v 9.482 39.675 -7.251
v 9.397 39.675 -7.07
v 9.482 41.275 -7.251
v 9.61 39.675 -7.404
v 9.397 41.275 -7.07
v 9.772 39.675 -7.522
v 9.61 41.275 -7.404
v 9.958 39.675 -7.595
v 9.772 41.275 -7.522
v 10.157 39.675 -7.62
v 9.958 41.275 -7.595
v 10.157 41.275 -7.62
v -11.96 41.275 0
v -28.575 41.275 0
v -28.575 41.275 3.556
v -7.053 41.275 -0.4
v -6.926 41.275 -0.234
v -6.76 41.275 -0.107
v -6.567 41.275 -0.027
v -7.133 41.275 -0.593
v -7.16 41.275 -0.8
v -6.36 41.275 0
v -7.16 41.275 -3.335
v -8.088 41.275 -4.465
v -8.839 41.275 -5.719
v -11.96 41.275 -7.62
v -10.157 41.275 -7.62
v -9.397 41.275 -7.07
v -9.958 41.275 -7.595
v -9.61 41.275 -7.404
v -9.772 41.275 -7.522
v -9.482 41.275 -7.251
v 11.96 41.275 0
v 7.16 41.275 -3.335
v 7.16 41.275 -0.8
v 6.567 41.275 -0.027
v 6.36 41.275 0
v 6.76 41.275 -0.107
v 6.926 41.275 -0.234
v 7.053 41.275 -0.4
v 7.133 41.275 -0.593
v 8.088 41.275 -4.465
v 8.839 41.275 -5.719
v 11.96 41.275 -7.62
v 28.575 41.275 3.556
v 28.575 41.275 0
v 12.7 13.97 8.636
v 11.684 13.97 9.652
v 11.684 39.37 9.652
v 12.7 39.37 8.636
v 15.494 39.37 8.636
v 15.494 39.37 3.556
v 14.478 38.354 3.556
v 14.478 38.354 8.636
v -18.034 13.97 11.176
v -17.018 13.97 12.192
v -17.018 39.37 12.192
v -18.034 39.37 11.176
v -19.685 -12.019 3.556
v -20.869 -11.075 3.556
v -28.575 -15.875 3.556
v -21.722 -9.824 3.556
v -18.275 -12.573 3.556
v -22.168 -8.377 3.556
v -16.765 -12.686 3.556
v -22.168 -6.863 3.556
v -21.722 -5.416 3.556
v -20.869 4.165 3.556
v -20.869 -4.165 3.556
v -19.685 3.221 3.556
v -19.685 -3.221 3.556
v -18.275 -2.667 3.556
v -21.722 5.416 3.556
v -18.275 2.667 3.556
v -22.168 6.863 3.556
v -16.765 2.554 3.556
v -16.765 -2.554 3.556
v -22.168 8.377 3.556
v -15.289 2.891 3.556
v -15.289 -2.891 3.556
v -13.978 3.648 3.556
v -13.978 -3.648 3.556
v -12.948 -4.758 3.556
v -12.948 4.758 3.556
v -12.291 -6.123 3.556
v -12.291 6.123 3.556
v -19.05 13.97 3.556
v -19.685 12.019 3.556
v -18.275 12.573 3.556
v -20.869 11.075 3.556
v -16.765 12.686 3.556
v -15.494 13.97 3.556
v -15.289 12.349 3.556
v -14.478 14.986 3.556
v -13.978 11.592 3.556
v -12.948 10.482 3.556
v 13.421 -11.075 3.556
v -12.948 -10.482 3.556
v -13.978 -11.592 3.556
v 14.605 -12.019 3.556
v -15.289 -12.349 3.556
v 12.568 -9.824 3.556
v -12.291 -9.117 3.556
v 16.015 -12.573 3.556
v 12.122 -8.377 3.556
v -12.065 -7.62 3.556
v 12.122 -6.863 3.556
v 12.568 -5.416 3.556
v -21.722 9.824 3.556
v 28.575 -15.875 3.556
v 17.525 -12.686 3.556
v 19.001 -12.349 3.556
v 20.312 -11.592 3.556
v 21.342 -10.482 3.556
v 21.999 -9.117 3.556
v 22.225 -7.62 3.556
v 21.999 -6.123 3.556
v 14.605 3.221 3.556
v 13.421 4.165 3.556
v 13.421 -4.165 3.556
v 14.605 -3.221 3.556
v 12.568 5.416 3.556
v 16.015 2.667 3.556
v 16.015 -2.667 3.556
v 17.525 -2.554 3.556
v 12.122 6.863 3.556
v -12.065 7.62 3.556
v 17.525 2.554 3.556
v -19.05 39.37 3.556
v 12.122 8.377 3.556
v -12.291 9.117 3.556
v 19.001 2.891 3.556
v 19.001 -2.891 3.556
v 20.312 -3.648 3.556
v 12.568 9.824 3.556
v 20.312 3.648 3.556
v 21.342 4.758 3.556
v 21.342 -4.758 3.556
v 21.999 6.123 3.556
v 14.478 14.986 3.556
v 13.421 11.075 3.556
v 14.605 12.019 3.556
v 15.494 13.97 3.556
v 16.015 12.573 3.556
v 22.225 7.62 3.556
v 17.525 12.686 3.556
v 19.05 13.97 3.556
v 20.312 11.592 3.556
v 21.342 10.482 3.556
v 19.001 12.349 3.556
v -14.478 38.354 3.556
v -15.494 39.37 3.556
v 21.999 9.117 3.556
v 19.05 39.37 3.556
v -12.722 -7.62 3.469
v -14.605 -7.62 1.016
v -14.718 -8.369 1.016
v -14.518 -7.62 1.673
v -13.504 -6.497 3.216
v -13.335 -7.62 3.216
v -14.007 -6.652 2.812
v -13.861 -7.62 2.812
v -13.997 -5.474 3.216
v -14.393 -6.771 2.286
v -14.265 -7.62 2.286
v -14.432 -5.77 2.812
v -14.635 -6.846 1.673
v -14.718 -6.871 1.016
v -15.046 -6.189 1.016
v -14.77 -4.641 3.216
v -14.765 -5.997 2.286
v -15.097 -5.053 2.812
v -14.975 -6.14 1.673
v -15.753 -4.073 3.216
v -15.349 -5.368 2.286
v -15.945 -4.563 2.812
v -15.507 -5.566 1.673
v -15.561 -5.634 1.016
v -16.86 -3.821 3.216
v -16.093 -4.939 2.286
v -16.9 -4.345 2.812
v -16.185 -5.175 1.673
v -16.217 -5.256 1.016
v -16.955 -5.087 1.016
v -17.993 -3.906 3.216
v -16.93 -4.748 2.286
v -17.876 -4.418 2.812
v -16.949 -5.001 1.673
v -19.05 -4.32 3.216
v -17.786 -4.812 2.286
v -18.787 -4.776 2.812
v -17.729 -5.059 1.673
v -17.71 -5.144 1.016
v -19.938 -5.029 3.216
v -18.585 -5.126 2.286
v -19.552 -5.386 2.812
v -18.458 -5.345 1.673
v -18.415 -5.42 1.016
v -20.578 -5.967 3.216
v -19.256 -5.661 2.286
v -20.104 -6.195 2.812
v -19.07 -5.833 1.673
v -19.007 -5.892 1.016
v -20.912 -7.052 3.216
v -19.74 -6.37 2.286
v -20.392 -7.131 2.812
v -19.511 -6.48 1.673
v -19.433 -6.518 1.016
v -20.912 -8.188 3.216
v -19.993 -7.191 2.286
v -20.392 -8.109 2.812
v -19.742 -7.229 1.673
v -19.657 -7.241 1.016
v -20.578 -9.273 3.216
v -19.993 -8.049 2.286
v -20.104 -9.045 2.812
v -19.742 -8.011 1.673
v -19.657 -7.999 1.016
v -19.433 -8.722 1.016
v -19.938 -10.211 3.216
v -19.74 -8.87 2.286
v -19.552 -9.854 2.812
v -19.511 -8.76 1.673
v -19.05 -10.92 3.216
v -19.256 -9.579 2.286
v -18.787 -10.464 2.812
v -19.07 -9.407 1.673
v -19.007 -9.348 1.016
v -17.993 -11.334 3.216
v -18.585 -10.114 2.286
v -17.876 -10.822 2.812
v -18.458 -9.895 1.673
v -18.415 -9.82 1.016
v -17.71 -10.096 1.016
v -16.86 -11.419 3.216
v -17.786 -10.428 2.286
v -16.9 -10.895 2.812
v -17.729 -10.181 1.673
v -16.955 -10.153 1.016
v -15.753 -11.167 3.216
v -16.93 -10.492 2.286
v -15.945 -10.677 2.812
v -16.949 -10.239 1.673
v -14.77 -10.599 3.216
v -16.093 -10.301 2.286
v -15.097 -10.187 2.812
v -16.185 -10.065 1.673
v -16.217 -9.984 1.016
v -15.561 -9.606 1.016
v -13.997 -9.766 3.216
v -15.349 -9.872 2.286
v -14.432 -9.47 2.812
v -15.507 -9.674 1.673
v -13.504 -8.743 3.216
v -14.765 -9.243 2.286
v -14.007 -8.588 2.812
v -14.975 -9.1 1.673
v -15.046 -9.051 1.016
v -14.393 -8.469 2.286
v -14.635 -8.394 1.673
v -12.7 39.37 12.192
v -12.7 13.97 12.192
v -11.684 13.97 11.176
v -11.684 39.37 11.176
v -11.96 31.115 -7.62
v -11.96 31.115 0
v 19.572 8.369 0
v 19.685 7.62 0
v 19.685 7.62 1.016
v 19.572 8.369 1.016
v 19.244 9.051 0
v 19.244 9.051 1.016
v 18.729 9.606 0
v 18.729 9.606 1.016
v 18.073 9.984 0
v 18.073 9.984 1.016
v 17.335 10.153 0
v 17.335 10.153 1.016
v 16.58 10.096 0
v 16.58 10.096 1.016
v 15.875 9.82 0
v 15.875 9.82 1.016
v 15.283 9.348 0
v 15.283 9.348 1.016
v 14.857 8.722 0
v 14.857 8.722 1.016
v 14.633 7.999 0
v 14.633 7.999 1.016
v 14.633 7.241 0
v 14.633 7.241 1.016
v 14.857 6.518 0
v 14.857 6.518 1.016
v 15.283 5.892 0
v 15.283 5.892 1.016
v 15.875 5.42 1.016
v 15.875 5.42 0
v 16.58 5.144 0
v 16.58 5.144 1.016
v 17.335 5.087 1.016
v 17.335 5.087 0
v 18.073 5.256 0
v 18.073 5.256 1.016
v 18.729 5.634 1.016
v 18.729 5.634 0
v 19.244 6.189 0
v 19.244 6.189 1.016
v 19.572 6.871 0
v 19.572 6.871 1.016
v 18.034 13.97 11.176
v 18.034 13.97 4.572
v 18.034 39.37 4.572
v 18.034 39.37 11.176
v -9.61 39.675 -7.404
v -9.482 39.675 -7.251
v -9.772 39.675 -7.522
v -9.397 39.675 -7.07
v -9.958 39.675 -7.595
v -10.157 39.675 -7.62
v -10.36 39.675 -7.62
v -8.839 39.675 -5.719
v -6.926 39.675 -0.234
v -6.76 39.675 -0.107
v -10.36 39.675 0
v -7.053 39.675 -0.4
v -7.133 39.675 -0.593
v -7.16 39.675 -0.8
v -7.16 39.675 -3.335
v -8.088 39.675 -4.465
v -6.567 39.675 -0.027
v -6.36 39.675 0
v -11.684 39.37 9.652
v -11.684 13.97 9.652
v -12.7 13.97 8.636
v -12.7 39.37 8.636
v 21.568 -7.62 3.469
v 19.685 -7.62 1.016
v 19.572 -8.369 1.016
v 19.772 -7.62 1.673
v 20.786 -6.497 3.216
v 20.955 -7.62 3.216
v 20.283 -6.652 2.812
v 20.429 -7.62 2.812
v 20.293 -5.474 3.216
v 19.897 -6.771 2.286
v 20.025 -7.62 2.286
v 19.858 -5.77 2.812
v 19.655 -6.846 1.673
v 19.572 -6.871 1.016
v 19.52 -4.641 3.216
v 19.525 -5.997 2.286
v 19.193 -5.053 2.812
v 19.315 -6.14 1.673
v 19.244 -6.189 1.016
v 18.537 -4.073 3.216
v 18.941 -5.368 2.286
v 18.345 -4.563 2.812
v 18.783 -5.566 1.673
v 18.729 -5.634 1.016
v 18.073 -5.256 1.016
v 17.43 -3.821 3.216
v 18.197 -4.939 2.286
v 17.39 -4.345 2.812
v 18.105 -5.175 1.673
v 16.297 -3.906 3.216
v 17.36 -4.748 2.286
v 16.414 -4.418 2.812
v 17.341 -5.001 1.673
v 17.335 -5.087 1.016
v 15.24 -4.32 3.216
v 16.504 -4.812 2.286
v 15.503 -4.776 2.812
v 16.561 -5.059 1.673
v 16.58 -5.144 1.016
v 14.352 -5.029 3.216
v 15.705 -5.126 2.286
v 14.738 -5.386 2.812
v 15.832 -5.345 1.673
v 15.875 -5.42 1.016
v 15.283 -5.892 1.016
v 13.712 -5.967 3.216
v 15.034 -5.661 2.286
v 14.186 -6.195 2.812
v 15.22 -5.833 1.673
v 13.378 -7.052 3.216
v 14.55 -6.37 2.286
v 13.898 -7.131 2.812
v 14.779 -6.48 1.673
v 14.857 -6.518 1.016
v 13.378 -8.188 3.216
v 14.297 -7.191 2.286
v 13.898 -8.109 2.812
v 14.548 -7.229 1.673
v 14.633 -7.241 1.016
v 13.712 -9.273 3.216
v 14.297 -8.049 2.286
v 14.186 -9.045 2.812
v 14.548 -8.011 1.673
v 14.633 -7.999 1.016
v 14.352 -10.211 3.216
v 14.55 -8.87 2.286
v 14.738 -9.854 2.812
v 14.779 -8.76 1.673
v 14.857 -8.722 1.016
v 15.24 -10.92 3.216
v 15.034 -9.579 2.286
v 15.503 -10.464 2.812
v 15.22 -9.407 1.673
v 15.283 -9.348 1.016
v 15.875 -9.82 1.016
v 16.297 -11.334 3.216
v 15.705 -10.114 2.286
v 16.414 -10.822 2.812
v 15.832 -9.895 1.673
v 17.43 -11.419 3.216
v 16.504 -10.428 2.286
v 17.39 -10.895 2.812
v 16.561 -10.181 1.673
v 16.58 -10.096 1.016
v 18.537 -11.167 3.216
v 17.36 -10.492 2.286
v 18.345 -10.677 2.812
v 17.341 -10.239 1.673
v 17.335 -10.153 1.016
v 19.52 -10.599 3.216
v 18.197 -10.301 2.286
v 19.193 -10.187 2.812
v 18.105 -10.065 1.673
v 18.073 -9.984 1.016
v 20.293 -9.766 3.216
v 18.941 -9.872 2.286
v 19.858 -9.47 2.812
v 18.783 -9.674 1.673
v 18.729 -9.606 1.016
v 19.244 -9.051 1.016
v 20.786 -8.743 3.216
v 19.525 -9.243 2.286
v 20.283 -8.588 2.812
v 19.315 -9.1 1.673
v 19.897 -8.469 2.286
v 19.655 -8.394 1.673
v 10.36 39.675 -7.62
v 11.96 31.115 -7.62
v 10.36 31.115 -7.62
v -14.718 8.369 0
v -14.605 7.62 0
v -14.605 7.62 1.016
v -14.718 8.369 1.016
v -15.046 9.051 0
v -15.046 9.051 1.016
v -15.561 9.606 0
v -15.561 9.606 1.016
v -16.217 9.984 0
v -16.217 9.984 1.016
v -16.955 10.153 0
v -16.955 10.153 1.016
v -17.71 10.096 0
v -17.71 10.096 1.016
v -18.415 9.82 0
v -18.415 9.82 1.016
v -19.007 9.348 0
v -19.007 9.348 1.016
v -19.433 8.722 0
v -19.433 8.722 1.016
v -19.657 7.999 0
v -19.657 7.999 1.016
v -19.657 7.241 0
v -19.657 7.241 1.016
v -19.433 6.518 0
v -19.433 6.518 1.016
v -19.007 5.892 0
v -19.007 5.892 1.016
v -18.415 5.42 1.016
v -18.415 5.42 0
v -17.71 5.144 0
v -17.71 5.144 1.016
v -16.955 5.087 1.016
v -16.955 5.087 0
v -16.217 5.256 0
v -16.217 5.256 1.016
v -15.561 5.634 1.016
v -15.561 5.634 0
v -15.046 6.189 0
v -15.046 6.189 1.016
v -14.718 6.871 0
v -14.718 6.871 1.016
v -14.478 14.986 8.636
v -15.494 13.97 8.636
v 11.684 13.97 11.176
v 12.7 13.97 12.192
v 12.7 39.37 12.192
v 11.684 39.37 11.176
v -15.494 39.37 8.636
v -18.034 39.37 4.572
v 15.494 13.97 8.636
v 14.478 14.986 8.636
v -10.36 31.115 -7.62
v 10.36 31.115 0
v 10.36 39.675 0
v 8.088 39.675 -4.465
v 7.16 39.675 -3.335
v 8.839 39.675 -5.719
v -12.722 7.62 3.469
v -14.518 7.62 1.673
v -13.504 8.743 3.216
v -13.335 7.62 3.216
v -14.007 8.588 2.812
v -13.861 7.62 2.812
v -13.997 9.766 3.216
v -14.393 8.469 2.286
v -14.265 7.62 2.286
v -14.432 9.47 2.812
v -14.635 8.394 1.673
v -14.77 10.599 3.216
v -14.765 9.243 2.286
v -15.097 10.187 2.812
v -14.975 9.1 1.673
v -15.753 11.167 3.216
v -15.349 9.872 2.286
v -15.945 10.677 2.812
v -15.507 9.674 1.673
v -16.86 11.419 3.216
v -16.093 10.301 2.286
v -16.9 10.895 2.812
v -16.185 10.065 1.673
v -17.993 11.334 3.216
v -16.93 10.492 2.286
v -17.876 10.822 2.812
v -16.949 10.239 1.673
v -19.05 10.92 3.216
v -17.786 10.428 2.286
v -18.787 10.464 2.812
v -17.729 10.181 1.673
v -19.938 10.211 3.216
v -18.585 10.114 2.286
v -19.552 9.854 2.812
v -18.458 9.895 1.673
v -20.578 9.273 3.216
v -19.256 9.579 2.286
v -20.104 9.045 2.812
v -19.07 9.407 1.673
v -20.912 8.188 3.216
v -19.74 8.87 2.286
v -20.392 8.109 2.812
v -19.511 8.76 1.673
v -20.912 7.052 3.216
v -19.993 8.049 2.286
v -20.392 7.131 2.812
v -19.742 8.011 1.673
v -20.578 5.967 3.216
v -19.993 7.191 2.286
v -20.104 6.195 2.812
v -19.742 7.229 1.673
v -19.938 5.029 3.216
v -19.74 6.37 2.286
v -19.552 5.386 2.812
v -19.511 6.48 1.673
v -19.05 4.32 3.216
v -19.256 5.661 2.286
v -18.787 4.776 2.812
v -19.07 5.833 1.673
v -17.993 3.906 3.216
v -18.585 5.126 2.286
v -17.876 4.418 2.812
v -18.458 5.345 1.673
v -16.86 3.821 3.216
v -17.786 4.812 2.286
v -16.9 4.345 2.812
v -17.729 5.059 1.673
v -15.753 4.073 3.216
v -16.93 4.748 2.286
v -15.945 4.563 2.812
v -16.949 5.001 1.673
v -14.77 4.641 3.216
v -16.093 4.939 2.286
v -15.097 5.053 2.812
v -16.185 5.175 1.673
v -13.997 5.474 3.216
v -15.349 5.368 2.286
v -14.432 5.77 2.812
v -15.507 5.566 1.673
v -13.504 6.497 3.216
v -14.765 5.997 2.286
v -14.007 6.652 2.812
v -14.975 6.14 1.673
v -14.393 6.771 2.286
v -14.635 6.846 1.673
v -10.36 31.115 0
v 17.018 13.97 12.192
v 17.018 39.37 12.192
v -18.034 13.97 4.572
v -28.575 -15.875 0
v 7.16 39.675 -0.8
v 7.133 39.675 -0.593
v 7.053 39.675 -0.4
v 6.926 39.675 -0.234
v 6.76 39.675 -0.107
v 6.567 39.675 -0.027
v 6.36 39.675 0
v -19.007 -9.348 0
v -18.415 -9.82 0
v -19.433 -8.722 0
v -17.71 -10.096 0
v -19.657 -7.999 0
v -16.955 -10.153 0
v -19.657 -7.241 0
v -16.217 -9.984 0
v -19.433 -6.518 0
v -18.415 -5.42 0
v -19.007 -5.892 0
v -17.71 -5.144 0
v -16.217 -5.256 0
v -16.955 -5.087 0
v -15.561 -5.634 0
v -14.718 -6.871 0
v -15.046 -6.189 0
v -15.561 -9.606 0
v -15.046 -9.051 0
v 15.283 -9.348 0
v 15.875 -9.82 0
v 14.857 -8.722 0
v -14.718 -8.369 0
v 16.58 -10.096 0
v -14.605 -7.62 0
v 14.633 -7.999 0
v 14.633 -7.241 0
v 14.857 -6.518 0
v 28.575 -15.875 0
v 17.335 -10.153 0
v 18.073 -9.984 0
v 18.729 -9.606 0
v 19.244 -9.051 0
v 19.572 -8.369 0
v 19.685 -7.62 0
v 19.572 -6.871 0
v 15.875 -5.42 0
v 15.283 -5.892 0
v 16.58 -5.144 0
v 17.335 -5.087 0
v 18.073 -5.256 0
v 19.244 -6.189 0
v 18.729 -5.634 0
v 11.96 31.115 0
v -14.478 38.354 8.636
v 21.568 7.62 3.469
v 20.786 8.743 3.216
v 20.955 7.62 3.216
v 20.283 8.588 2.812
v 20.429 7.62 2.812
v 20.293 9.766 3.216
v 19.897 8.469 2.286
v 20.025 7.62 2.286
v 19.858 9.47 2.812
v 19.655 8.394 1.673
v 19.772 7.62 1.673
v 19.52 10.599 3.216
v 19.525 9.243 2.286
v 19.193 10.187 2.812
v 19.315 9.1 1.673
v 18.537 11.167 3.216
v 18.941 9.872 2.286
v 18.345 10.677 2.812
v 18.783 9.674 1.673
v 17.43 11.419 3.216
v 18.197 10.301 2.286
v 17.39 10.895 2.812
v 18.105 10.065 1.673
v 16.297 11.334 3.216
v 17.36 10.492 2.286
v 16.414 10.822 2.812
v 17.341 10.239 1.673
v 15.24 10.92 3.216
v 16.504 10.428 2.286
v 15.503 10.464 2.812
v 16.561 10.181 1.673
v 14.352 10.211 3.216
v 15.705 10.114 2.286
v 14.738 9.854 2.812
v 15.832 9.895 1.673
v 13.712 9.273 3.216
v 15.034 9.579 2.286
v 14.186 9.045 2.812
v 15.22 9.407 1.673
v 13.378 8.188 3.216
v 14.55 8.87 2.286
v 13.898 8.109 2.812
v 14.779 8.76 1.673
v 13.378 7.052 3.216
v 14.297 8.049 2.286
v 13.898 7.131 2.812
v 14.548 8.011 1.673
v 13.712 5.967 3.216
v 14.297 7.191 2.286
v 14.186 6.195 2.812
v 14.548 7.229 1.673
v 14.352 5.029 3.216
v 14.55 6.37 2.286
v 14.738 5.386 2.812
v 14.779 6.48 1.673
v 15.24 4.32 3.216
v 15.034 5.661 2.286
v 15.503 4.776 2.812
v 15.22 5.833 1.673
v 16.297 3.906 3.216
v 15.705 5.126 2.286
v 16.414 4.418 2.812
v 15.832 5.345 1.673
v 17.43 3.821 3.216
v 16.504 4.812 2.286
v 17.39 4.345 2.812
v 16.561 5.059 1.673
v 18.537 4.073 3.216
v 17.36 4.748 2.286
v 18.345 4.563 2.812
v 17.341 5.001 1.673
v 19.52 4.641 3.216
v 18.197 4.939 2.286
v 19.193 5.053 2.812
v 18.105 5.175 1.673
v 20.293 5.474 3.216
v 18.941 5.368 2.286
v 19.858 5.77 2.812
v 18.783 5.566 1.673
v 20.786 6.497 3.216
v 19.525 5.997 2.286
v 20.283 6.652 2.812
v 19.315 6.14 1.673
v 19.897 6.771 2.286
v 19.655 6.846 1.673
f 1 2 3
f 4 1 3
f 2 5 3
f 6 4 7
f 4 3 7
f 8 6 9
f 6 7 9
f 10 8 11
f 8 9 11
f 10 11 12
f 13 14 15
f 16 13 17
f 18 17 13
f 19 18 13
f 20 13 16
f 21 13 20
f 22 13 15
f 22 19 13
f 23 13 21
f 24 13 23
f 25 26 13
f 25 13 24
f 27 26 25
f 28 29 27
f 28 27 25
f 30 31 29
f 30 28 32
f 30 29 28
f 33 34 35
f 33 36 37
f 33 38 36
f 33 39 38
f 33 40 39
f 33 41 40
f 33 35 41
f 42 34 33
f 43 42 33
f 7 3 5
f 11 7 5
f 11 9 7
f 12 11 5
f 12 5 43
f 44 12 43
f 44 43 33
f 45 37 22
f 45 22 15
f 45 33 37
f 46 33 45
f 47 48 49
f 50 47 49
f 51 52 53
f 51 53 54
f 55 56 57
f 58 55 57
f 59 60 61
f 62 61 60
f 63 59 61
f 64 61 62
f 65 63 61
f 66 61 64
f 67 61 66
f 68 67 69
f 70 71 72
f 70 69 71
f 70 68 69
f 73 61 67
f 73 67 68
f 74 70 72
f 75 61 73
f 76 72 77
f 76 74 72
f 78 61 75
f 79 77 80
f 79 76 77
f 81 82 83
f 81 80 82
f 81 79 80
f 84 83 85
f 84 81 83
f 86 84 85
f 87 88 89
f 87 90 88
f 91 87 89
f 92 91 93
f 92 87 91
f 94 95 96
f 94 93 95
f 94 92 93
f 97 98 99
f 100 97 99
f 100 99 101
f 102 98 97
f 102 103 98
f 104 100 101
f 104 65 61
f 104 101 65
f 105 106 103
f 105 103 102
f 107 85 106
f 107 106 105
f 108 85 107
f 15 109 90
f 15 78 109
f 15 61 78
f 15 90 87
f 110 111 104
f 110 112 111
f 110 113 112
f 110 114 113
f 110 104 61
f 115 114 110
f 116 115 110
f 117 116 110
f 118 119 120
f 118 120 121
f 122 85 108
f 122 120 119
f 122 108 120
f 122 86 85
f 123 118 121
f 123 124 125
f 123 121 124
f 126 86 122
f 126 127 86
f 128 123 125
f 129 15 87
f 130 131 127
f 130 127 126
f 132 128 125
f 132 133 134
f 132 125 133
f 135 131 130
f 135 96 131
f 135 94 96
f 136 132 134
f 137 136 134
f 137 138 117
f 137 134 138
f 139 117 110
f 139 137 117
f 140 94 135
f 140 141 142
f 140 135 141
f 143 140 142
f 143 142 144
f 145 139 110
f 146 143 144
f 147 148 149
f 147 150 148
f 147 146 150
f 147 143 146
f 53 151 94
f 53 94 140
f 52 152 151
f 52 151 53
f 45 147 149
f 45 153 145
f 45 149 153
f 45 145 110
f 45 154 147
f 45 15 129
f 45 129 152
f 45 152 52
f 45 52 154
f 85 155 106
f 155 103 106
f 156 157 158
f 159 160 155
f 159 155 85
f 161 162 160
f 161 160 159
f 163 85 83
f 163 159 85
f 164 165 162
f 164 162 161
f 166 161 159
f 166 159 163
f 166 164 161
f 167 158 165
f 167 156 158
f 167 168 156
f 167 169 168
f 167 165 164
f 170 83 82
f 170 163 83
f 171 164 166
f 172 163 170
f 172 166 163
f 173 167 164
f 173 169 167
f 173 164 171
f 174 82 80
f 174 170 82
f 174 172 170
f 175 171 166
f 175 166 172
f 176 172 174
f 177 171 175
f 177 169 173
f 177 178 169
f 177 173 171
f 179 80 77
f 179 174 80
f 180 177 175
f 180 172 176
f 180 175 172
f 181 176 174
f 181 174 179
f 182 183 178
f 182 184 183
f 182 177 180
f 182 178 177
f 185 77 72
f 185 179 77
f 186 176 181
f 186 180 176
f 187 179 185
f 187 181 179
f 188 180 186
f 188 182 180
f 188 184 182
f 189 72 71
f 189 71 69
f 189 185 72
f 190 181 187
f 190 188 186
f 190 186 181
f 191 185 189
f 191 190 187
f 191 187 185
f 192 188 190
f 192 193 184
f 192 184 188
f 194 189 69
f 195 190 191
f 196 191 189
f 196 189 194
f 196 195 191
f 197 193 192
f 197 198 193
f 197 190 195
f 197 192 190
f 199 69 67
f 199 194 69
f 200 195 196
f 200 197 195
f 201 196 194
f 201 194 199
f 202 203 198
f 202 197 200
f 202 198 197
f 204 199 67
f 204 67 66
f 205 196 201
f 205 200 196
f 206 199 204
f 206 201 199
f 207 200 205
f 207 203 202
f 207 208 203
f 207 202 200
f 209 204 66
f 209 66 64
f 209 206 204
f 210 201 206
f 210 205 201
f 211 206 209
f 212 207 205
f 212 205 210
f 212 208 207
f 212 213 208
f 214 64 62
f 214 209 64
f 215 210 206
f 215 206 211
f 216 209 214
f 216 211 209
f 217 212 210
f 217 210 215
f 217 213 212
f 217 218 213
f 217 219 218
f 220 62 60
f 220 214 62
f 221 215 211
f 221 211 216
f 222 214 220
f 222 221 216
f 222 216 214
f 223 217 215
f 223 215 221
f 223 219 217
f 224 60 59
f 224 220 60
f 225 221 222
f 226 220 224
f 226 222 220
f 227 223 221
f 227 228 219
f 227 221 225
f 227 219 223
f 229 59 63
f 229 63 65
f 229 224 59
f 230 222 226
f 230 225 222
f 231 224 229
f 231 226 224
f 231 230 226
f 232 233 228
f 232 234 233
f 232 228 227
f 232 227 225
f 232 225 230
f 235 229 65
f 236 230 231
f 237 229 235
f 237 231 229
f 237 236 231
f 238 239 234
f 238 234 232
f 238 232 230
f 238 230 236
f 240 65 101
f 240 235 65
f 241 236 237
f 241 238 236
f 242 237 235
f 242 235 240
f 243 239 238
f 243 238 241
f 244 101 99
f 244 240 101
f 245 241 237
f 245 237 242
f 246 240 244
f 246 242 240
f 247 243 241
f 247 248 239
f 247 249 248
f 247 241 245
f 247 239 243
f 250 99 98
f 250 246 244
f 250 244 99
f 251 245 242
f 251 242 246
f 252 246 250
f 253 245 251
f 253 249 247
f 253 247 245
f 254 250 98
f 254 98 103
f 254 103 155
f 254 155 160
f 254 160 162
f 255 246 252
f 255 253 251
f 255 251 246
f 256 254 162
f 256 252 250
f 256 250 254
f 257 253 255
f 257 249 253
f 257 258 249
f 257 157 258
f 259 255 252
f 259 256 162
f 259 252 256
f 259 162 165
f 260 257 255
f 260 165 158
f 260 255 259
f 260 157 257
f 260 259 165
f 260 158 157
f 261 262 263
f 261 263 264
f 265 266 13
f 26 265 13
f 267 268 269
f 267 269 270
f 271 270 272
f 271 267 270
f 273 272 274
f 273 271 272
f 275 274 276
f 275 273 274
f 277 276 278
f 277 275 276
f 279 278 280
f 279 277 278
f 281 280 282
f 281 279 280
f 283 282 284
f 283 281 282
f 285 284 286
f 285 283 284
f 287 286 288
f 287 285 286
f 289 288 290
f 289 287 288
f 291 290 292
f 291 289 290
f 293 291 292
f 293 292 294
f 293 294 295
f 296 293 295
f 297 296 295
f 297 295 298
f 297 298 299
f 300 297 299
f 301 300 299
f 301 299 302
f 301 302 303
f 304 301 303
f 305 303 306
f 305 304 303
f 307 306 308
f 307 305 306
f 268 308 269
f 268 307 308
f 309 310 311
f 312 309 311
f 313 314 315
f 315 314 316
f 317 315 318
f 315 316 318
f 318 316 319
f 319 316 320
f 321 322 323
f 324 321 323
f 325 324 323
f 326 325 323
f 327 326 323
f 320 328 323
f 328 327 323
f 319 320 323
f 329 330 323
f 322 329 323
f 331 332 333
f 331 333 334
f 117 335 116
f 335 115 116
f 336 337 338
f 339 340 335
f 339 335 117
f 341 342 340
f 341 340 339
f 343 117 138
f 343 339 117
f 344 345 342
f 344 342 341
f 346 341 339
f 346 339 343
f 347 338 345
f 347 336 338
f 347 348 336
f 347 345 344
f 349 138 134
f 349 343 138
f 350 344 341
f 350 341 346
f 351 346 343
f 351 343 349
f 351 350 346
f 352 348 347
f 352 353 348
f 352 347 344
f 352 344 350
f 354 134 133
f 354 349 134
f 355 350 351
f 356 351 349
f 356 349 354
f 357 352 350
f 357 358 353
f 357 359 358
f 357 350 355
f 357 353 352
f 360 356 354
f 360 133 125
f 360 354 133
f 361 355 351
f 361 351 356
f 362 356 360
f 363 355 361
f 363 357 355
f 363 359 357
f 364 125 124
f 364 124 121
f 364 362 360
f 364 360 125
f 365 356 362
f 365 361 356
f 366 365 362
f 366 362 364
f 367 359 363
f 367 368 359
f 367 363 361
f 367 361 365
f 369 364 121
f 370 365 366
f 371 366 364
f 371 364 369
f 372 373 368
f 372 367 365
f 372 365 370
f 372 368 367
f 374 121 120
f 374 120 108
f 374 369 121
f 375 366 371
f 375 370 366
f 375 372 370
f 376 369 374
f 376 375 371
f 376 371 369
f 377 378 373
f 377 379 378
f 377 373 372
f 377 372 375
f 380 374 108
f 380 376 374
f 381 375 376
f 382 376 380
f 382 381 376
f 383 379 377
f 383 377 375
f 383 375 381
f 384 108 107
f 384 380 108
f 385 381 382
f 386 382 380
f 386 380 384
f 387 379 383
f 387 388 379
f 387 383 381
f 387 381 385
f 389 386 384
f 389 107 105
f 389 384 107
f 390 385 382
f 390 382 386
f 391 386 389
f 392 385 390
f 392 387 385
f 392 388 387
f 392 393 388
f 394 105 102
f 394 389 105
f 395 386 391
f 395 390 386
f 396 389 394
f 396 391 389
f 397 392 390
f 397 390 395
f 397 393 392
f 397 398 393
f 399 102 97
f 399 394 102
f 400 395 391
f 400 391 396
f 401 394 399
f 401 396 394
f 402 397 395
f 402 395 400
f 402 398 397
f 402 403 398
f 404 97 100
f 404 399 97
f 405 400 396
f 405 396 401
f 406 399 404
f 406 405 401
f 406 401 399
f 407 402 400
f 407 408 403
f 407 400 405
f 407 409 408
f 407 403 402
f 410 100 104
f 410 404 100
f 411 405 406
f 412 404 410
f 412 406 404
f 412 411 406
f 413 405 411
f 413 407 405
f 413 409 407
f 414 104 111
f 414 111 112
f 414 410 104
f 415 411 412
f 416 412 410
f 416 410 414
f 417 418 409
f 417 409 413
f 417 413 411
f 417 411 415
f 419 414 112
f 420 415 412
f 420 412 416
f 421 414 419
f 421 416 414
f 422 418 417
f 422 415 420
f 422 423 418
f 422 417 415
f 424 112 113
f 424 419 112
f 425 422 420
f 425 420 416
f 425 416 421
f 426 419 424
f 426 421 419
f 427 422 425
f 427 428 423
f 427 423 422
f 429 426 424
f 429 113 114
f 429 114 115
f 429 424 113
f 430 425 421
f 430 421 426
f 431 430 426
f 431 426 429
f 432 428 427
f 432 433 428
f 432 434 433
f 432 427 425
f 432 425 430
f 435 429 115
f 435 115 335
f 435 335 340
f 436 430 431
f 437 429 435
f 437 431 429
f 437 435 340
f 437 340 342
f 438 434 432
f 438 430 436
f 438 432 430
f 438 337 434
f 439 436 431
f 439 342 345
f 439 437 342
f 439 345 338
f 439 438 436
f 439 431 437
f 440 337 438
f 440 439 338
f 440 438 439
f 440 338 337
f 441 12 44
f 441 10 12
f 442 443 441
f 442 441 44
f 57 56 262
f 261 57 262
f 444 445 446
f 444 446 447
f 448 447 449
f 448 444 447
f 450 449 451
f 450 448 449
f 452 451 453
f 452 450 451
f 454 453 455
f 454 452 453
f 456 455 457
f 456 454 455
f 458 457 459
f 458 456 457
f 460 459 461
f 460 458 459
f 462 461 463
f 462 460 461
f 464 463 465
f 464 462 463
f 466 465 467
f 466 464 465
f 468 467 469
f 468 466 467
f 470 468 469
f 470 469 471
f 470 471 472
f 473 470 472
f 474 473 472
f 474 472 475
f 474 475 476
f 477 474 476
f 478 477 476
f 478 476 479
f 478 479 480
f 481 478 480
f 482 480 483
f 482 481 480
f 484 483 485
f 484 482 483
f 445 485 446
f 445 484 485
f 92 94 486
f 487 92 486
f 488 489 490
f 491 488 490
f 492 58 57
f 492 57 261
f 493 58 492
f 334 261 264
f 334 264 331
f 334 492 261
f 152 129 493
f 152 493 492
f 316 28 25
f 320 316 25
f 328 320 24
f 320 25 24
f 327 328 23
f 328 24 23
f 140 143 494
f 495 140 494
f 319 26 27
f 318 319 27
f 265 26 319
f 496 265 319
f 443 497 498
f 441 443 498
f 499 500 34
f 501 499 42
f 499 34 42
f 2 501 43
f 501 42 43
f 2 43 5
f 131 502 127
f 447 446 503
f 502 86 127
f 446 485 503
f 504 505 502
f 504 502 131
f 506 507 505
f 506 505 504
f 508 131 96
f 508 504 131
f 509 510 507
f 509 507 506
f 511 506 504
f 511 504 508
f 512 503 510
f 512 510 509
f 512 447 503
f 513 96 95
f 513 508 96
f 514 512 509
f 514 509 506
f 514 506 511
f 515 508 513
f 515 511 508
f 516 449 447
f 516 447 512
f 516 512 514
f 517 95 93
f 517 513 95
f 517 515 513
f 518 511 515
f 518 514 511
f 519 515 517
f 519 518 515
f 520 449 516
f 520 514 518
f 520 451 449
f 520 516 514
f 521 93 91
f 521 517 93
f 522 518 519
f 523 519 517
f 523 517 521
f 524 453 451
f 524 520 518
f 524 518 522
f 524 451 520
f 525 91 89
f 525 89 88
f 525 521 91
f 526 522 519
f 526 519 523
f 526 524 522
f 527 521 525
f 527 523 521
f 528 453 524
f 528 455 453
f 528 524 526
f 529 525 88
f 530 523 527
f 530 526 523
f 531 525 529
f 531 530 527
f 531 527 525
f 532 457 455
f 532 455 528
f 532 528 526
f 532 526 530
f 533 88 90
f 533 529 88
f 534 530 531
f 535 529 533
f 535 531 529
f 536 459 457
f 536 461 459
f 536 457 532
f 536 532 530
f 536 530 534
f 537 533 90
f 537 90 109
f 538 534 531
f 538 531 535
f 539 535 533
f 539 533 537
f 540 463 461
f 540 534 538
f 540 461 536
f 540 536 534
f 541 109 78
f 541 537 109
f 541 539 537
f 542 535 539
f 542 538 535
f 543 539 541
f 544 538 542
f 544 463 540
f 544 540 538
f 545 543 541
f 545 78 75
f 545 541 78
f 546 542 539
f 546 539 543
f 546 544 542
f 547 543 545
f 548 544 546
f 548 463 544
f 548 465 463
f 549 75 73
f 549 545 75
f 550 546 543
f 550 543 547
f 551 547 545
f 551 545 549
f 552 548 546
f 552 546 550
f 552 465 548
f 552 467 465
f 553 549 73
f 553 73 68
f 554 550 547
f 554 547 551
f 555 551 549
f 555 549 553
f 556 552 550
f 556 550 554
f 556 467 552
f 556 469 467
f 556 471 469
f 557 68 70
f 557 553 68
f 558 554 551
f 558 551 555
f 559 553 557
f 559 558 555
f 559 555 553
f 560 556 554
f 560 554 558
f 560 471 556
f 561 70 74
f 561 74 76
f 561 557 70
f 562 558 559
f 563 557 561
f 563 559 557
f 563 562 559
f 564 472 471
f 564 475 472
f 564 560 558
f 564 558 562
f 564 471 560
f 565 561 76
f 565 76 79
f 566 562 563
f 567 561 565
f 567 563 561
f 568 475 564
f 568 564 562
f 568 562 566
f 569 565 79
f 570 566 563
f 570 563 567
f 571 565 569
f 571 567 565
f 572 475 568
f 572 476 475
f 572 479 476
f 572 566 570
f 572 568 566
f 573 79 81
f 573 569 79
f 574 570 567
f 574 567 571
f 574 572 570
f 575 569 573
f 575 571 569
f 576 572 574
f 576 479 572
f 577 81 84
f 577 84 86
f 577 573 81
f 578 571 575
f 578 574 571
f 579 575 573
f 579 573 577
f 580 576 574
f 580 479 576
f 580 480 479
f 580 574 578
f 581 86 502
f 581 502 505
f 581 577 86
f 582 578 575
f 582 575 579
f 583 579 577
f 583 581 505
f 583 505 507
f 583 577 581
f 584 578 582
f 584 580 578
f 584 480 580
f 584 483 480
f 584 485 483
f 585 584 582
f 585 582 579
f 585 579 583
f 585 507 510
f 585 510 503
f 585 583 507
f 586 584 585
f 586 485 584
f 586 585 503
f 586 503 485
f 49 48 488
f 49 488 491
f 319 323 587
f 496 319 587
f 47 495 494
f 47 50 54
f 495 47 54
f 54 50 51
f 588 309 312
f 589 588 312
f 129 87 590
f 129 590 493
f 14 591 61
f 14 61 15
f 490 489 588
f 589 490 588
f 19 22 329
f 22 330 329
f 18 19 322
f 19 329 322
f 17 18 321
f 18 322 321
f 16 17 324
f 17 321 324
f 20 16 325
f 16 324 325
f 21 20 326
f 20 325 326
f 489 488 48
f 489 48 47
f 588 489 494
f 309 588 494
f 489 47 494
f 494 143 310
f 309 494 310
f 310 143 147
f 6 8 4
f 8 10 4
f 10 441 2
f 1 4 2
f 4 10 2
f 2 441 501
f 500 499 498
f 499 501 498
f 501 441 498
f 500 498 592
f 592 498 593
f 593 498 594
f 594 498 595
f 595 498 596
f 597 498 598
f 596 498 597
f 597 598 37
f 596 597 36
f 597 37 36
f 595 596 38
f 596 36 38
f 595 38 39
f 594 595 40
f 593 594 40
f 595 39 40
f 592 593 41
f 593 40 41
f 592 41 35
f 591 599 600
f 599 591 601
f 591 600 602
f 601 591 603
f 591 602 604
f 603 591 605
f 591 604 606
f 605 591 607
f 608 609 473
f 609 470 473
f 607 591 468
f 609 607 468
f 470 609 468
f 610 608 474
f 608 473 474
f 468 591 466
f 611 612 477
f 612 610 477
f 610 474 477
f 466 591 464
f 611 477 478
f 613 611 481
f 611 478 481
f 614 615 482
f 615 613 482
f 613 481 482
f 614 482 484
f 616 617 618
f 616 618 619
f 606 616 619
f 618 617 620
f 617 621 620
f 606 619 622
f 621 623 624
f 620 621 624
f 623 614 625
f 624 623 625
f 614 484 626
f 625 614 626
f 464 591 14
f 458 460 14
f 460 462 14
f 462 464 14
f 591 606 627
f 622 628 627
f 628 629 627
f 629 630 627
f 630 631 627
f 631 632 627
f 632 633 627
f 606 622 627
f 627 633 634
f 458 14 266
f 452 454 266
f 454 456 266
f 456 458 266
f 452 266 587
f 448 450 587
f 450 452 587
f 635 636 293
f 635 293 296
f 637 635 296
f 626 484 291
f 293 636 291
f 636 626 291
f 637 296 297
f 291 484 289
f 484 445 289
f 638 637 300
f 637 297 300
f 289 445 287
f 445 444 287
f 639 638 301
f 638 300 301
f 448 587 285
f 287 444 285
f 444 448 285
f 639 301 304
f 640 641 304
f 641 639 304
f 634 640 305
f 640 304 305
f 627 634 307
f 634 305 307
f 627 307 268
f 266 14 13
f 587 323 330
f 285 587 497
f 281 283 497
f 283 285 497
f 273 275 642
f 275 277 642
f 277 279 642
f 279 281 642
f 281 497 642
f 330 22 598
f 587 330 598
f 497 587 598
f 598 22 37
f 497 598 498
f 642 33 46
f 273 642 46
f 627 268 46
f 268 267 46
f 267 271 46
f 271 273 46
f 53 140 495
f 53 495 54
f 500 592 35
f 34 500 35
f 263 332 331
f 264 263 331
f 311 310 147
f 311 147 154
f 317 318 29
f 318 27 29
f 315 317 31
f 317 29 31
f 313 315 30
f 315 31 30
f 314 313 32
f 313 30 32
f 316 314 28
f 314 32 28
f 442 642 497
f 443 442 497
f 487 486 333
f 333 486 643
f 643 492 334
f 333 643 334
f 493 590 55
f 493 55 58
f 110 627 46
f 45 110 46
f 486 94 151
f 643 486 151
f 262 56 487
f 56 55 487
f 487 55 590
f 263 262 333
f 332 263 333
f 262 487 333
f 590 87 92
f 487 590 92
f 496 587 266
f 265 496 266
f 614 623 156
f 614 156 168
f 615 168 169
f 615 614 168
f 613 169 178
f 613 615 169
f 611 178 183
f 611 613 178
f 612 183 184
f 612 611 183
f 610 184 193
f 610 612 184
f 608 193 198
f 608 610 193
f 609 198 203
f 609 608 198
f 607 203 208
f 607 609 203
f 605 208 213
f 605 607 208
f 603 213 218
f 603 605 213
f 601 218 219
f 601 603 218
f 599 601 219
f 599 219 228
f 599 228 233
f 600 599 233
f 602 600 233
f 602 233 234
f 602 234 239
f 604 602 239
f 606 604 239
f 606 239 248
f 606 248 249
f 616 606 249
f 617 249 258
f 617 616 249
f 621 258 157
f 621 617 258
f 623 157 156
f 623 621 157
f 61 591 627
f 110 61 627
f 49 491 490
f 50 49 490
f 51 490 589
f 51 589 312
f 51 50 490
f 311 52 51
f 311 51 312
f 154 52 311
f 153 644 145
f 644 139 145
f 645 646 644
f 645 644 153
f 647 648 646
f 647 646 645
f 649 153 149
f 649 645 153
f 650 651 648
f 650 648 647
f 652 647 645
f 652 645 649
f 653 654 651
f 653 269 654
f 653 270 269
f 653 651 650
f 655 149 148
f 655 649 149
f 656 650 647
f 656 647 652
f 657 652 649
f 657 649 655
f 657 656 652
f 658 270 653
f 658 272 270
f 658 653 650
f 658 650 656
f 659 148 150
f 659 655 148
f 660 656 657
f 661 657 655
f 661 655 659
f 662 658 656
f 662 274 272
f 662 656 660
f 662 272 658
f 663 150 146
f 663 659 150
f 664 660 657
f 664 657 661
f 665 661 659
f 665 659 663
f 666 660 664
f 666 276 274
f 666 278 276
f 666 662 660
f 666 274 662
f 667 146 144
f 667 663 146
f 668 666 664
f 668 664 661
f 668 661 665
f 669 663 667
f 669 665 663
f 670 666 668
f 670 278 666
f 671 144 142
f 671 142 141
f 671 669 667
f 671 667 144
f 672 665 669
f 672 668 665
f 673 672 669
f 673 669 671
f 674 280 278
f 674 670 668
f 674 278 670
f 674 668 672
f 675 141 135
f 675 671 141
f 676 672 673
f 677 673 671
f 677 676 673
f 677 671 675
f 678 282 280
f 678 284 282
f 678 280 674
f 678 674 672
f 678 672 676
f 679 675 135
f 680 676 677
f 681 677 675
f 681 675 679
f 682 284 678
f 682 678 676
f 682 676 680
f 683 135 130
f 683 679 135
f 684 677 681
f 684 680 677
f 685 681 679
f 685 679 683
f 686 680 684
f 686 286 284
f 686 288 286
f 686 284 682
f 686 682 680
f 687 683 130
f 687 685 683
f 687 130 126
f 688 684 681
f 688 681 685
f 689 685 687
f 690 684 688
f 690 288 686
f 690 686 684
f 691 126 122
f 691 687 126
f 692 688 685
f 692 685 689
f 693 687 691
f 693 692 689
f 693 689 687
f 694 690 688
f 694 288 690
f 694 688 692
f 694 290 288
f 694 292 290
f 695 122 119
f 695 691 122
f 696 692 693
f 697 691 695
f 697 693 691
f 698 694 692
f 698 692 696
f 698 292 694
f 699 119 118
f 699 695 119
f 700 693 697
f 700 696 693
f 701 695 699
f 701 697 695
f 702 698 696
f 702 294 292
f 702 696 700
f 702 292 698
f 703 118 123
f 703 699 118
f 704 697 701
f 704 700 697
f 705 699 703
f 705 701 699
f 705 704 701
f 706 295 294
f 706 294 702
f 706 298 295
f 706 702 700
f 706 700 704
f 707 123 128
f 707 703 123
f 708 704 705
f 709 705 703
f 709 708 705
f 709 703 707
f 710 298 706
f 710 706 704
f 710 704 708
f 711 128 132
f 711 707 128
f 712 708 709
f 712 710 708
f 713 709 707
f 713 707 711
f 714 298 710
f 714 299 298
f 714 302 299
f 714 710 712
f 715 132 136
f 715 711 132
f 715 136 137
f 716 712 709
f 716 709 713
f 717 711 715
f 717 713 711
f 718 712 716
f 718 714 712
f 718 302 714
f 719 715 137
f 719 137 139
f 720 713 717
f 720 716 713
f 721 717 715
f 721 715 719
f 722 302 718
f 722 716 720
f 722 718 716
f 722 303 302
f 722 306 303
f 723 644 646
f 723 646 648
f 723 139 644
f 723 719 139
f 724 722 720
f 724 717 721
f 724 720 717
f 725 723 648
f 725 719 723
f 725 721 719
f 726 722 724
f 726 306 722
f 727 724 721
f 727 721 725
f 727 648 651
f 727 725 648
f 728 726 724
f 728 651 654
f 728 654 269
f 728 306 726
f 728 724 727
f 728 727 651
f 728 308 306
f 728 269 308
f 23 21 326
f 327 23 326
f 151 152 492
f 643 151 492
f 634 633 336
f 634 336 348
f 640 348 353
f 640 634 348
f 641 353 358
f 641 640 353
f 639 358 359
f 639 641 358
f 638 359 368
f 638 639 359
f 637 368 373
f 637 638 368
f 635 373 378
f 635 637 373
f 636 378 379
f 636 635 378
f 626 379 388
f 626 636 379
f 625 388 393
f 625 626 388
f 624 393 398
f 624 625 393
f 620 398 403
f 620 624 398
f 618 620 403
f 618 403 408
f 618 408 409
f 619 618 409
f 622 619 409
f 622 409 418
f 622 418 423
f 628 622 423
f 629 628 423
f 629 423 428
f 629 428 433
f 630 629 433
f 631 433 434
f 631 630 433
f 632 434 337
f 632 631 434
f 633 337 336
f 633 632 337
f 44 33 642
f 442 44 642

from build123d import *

# Parameters (mm, degrees)
F0_W      = 57.15
F0_H      = 31.75
F0_R      = 2.54
F1_DEPTH  = 3.556
F2_W      = 57.15
F2_H      = 25.4
F3_DEPTH  = 3.556
F4_R      = 2.54
F5_W      = 3.556
F5_H      = 25.4
F6_DEPTH  = 5.08
F7_W      = 6.35
F7_H      = 25.4
F8_DEPTH  = 3.556
F9_SIZE   = 1.016
F11_DEPTH = 7.62
F12_R     = 9.8916732659
F13_DEPTH = 25.4
F14_R     = 0.8


with BuildPart() as f1:
    # F0 (on Top) → F1 (new body)
    with BuildSketch(Plane.XY):
        Rectangle(F0_W, F0_H)
        with Locations((-17.145, -7.62)):
            Circle(F0_R, mode=Mode.SUBTRACT)
        with Locations((17.145, -7.62)):
            Circle(F0_R, mode=Mode.SUBTRACT)
        with Locations((-17.145, 7.62)):
            Circle(F0_R, mode=Mode.SUBTRACT)
        with Locations((17.145, 7.62)):
            Circle(F0_R, mode=Mode.SUBTRACT)
    extrude(amount=F1_DEPTH)

    # F2 (on Top) → F3 (join)
    with BuildSketch(Plane.XY):
        with Locations((0, 28.575)):
            Rectangle(F2_W, F2_H)
    extrude(amount=F3_DEPTH)

    # F4
    f4_edges = [f1.edges().sort_by_distance(p)[0] for p in [
        (-19.685, 7.62, 3.556),
        (14.605, 7.62, 3.556),
        (14.605, -7.62, 3.556),
        (-19.685, -7.62, 3.556),
    ]]
    fillet(f4_edges, radius=F4_R)

    # F5 (on face) → F6 (join)
    with BuildSketch(Plane.XY.offset(3.556)):
        with Locations((-16.256, 26.67)):
            Rectangle(F5_W, F5_H)
        with Locations((16.256, 26.67)):
            Rectangle(F5_W, F5_H)
    extrude(amount=F6_DEPTH)

    # F7 (on face) → F8 (join)
    with BuildSketch(Plane.XY.offset(8.636)):
        with Locations((-14.859, 26.67)):
            Rectangle(F7_W, F7_H)
        with Locations((14.859, 26.67)):
            Rectangle(F7_W, F7_H)
    extrude(amount=F8_DEPTH)

    # F9
    f9_edges = [f1.edges().sort_by_distance(p)[0] for p in [
        (-11.684, 26.67, 12.192),
        (-11.684, 26.67, 8.636),
        (11.684, 26.67, 12.192),
        (11.684, 26.67, 8.636),
        (18.034, 26.67, 12.192),
        (-18.034, 26.67, 12.192),
        (18.034, 26.67, 3.556),
        (-18.034, 26.67, 3.556),
        (14.478, 39.37, 6.096),
        (-14.478, 39.37, 6.096),
        (-14.478, 13.97, 6.096),
        (14.478, 13.97, 6.096),
    ]]
    chamfer(f9_edges, length=F9_SIZE)

    # F10 (on face) → F11 (join)
    with BuildSketch(Plane(origin=(0, 0, 0), x_dir=(1, 0, 0), z_dir=(0, 0, -1))):
        Polygon((-11.96, -41.275), (-7.16, -41.275), (-7.16, -39.675), (-10.36, -39.675), (-10.36, -31.115), (-11.96, -31.115), align=None)
        Polygon((10.36, -31.115), (10.36, -39.675), (7.16, -39.675), (7.16, -41.275), (11.96, -41.275), (11.96, -31.115), align=None)
    extrude(amount=F11_DEPTH)

    # F12 (on face) → F13 (cut)
    with BuildSketch(Plane(origin=(0, 41.275, 0), x_dir=(-1, 0, 0), z_dir=(0, 1, 0))):
        with Locations((0, -10.16)):
            Circle(F12_R)
    extrude(amount=-F13_DEPTH, mode=Mode.SUBTRACT)

    # F14
    f14_edges = [f1.edges().sort_by_distance(p)[0] for p in [
        (9.56, 40.475, -7.62),
        (-9.56, 40.475, -7.62),
        (-7.16, 40.475, 0),
        (7.16, 40.475, 0),
    ]]
    fillet(f14_edges, radius=F14_R)


solid = f1.part
